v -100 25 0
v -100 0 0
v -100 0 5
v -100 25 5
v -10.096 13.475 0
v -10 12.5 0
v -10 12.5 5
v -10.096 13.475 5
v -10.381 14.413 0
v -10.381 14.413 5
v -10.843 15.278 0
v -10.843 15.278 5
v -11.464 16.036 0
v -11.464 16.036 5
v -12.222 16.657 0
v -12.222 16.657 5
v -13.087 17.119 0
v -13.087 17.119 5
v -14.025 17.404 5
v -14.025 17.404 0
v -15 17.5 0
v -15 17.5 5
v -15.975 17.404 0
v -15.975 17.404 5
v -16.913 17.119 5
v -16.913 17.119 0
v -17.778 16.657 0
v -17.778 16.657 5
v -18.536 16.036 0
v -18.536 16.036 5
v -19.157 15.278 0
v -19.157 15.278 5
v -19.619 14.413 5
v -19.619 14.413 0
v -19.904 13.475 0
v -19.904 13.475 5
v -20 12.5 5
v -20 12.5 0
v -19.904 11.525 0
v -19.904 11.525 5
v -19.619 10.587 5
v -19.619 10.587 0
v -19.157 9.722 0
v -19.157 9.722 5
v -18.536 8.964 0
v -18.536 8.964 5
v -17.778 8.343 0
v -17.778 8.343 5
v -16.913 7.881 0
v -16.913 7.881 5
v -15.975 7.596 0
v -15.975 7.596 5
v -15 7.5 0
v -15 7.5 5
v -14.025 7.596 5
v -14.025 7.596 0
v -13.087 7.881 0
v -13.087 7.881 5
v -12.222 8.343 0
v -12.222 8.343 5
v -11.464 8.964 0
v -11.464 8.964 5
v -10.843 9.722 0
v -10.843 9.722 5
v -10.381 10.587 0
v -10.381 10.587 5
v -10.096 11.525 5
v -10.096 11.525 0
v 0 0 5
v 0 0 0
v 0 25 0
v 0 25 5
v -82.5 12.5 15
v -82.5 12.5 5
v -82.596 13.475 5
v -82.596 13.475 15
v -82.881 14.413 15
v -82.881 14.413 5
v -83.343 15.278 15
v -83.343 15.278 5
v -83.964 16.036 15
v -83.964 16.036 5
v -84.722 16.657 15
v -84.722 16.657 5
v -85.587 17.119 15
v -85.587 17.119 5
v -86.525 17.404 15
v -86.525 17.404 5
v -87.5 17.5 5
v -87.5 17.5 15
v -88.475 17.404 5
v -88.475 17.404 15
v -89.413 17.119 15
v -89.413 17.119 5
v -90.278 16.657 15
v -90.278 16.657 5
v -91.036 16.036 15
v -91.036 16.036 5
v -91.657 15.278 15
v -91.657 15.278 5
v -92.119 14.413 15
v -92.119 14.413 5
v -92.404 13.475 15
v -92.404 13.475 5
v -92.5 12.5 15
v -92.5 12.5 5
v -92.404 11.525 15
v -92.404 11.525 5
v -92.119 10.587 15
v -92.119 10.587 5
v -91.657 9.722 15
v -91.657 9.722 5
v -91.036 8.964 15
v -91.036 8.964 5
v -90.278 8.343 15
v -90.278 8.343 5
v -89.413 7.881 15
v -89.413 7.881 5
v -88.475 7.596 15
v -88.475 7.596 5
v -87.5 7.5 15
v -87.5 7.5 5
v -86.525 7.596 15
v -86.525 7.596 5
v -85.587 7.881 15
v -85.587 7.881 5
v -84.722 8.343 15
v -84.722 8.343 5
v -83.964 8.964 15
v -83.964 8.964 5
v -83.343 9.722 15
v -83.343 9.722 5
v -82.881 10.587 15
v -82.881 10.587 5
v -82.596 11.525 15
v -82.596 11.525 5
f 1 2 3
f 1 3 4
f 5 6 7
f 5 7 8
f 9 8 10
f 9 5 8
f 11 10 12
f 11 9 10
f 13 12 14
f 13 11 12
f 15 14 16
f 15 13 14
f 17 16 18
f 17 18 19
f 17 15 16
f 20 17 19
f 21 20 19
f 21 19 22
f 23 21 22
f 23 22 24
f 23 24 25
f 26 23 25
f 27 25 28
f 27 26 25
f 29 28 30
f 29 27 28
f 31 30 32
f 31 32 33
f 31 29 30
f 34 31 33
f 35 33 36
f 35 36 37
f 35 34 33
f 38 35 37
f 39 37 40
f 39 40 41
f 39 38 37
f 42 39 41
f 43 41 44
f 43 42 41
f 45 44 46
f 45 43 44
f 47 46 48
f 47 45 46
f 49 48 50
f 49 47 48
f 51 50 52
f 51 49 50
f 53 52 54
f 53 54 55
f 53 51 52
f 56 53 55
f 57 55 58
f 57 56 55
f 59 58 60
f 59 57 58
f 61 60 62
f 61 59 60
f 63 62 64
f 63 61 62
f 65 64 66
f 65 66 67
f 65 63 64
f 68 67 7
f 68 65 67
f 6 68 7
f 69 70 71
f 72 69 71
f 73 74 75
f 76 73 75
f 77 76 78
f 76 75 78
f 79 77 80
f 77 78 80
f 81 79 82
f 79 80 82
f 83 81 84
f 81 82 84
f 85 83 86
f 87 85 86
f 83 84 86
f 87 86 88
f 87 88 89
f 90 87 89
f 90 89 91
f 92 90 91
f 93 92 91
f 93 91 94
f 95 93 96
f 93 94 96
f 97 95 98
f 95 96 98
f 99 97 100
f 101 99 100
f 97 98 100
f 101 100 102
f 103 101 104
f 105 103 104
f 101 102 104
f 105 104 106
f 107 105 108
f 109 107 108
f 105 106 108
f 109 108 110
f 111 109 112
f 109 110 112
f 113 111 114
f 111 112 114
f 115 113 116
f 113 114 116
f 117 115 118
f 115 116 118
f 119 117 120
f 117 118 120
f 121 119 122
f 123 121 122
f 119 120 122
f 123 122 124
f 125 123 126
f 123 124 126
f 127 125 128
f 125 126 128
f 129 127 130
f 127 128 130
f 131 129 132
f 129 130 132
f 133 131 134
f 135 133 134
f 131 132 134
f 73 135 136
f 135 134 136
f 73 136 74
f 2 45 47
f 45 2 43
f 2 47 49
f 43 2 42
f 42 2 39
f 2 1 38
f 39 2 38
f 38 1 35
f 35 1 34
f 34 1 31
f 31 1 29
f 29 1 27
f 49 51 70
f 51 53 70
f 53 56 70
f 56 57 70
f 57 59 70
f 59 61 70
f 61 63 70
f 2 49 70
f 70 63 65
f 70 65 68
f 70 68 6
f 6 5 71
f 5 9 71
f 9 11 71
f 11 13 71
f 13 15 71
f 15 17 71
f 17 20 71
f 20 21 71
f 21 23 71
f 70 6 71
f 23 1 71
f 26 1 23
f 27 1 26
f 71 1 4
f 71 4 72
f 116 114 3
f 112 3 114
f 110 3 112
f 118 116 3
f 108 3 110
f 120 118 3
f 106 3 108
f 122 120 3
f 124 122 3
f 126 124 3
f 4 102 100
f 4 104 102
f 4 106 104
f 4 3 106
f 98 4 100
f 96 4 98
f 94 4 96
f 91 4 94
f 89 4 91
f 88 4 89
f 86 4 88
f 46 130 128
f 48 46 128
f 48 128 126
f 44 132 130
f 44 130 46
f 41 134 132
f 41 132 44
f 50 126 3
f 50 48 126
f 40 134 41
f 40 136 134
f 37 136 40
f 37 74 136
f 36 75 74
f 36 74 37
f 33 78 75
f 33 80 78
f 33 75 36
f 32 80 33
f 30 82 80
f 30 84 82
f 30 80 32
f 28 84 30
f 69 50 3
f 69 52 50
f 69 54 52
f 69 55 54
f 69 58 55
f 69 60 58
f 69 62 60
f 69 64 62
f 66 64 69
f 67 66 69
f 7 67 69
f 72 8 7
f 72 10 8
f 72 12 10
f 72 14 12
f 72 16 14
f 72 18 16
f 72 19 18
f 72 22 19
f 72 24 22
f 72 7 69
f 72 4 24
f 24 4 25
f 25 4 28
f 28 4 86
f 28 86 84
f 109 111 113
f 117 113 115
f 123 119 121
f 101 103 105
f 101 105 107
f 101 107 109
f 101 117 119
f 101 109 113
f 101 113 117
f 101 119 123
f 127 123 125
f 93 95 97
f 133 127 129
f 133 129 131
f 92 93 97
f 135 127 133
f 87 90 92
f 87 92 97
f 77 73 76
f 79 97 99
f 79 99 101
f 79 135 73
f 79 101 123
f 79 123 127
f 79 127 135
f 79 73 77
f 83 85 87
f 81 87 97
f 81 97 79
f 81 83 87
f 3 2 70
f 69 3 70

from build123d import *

# Parameters (mm, degrees)
SKETCH1_W           = 100
SKETCH1_H           = 25
SKETCH1_R           = 5
BOSS_EXTRUDE1_DEPTH = 5
SKETCH2_R           = 5
BOSS_EXTRUDE2_DEPTH = 10


with BuildPart() as part:
    # Sketch1 → Boss-Extrude1 (new body)
    with BuildSketch(Plane.XY):
        with Locations((-50, 12.5)):
            Rectangle(SKETCH1_W, SKETCH1_H)
        with Locations((-15, 12.5)):
            Circle(SKETCH1_R, mode=Mode.SUBTRACT)
    extrude(amount=BOSS_EXTRUDE1_DEPTH)

    # Sketch2 → Boss-Extrude2 (add)
    with BuildSketch(Plane.XY.offset(5)):
        with Locations((-87.5, 12.5)):
            Circle(SKETCH2_R)
    extrude(amount=BOSS_EXTRUDE2_DEPTH)


solid = part.part
